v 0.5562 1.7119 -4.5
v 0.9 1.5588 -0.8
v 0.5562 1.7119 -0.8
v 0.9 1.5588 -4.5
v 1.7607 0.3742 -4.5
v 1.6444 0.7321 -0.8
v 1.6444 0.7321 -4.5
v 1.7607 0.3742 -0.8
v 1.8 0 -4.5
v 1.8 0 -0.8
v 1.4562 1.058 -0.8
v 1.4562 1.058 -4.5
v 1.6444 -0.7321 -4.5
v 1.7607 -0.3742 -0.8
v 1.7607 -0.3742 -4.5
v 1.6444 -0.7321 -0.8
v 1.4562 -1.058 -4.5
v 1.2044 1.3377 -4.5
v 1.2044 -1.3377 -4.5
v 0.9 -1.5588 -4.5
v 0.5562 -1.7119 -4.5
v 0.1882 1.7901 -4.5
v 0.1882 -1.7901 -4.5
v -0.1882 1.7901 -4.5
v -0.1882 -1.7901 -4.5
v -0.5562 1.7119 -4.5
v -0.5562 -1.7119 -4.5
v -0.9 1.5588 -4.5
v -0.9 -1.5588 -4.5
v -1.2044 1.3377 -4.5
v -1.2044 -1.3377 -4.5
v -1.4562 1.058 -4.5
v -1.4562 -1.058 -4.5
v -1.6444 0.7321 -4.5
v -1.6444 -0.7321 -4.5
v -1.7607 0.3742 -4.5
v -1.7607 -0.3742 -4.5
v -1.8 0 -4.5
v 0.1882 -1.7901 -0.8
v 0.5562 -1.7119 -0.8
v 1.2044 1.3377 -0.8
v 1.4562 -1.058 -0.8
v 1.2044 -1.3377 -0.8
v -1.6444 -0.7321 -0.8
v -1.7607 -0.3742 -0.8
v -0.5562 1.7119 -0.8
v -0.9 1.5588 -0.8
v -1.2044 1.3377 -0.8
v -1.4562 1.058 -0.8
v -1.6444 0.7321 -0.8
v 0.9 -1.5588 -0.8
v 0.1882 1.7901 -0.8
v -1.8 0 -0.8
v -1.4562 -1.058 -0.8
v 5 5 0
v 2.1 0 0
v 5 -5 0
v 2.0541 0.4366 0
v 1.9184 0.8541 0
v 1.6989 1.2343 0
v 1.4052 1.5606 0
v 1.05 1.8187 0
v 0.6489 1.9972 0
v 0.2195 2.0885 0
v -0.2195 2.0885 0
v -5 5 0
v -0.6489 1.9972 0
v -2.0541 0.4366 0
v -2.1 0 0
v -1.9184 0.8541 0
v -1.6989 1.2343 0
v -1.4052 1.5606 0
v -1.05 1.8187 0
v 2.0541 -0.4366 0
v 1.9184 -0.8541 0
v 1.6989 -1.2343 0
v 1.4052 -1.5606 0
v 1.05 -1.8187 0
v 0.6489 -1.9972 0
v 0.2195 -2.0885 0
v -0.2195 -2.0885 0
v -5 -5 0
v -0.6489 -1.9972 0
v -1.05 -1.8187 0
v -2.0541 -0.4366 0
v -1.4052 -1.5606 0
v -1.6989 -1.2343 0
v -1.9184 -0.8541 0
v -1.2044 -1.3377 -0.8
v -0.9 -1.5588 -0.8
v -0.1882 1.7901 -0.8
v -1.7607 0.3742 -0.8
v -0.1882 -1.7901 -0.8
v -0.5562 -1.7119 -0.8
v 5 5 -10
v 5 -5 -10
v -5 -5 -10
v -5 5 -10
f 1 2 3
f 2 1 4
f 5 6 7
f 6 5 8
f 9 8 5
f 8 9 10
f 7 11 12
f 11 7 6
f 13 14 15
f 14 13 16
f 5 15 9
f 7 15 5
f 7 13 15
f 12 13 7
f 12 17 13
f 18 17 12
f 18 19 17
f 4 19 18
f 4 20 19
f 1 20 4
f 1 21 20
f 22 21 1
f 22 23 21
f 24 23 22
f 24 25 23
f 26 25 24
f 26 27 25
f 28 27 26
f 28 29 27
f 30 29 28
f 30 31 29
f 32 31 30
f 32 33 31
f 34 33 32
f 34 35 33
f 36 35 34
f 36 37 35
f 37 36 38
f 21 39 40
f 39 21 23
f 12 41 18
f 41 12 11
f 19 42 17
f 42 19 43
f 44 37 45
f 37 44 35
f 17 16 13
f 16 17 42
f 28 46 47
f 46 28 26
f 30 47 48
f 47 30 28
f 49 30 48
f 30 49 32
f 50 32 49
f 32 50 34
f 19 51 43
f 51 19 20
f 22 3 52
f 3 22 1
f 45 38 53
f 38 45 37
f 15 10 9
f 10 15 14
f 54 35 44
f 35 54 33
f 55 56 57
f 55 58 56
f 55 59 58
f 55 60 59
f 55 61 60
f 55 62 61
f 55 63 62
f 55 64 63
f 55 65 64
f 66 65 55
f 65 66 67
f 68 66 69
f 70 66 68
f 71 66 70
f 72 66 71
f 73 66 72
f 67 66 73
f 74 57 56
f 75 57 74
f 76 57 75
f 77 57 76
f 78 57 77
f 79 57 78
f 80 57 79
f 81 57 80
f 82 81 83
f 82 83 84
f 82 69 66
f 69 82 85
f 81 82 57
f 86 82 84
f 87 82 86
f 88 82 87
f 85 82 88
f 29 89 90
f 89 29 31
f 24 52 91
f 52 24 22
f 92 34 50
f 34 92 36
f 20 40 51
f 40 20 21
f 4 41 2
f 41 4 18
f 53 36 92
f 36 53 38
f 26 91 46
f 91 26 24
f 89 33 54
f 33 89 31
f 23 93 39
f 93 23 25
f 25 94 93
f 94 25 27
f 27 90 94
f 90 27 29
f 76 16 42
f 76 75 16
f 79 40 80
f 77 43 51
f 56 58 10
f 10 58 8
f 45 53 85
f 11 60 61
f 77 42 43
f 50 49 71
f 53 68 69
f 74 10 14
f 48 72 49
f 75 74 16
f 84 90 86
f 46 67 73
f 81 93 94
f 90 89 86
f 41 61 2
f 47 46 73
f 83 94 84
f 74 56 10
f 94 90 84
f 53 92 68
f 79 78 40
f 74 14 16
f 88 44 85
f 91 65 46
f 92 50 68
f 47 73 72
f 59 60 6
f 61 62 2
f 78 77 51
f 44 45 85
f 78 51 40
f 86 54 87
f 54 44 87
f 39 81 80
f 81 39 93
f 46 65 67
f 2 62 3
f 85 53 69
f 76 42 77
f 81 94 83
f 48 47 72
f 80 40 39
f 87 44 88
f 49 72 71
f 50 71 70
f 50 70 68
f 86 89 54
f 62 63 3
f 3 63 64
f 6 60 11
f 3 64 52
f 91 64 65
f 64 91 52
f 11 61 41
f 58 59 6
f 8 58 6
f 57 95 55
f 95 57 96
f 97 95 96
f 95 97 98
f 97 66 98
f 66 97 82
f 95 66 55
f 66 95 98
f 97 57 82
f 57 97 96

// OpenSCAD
// file: hsi.scad
module hsi(d_min, depth, d_taper=-1, depth_taper=-1) {
    translate([0, 0, -depth]) cylinder(d=d_min, h=depth);
    if (d_taper > 0 && depth_taper > 0) {
        translate([0, 0, -depth_taper]) cylinder(d1=d_min, d2=d_taper, h=depth_taper);
    } else if (d_taper > 0 || depth_taper > 0) {
        echo("hsi: Ignoring invalid taper parameter.");
    }
}

// Non-tapered hole
//hsi(5.2, 3.8*1.5);

// Tapered hole
//hsi(5.2, 3.8*1.5, 5.6, 1);
// main file
use <hsi.scad>;

$fn=30;
difference() {
    translate([0, 0, -5]) cube([10, 10, 10], center=true);
    hsi(3.6, 3*1.5, d_taper=4.2, depth_taper=0.8);
}
